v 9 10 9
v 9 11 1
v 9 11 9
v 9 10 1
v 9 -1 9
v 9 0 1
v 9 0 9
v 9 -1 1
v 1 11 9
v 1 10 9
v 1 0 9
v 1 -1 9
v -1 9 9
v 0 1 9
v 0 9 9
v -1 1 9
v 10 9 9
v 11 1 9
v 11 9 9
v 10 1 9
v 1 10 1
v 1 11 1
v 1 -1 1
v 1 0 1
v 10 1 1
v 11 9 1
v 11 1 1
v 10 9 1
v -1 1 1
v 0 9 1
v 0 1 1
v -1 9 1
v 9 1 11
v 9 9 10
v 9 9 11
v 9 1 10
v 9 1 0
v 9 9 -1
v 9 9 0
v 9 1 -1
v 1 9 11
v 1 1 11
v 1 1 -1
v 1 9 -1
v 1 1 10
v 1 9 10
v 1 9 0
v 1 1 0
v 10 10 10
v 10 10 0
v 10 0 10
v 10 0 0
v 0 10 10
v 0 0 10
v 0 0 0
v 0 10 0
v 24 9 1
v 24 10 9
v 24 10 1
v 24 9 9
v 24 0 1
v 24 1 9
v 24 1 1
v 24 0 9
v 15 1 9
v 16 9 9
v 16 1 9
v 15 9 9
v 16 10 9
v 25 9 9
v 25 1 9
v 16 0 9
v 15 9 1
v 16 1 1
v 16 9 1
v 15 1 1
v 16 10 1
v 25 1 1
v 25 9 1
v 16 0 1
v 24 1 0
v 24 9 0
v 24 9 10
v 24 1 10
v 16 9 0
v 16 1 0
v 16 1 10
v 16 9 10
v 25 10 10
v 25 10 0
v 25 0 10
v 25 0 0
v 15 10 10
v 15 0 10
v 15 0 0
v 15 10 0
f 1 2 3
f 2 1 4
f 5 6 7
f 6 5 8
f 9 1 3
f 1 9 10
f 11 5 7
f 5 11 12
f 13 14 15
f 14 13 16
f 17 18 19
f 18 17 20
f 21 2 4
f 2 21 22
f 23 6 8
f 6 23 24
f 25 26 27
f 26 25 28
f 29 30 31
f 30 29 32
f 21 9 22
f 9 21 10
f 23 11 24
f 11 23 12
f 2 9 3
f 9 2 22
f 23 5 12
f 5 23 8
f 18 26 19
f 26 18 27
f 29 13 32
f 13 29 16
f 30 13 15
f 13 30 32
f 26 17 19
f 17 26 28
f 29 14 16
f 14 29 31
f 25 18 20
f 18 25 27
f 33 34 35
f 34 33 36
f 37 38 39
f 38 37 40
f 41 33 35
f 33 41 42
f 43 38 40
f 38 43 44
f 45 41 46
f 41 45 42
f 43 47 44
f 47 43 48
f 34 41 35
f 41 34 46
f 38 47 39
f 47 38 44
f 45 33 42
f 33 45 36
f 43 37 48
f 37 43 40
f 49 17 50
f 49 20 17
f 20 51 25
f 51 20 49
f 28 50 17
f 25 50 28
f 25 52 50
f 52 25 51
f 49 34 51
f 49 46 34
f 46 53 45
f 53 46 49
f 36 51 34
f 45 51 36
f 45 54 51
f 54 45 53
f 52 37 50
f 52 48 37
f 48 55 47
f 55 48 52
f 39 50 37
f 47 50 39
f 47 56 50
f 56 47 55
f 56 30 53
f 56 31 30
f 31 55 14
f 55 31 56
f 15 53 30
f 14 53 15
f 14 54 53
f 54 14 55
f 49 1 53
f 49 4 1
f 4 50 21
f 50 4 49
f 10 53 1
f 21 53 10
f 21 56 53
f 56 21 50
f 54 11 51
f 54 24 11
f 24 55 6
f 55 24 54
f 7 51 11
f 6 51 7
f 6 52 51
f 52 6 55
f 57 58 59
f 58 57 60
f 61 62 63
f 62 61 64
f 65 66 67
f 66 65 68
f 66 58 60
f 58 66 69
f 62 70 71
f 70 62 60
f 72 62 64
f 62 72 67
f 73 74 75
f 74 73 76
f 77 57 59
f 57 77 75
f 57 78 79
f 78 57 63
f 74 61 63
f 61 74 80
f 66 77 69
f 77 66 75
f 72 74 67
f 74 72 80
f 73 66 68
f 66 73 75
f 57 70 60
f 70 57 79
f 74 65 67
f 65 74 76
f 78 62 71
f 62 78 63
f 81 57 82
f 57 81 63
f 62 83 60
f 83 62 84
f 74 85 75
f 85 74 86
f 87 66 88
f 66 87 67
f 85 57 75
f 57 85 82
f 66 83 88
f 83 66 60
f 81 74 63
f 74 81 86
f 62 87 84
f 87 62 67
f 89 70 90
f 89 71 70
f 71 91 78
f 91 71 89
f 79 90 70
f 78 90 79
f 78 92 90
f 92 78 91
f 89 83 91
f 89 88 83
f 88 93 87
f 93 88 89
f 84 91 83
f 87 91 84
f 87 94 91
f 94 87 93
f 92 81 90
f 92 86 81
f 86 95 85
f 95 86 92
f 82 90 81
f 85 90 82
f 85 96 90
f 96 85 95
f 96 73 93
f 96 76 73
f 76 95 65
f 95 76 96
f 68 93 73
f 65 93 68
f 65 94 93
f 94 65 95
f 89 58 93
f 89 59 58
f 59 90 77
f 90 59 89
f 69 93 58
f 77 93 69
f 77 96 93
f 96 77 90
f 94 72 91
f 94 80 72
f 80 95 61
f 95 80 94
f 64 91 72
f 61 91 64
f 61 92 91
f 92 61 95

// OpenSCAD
// Cubes with other cubes sticking out
// Would look the same as union and intersection
translate([0,0,0]) {
    cube(10);
    color("red") {
        translate([1, -1, 1]) {
            cube([8, 12, 8]);
        }
        translate([-1, 1, 1]) {
            cube([12, 8, 8]);
        }
        translate([1, 1, -1]) {
            cube([8, 8, 12]);
        }
    }
}

// Extract cubes to create a frame
translate([15,0,0]) {
    difference() {
        cube(10);
        color("red") {
            translate([1, -1, 1]) {
                cube([8, 12, 8]);
            }
            translate([-1, 1, 1]) {
                cube([12, 8, 8]);
            }
            translate([1, 1, -1]) {
                cube([8, 8, 12]);
            }
        }
    }
}
